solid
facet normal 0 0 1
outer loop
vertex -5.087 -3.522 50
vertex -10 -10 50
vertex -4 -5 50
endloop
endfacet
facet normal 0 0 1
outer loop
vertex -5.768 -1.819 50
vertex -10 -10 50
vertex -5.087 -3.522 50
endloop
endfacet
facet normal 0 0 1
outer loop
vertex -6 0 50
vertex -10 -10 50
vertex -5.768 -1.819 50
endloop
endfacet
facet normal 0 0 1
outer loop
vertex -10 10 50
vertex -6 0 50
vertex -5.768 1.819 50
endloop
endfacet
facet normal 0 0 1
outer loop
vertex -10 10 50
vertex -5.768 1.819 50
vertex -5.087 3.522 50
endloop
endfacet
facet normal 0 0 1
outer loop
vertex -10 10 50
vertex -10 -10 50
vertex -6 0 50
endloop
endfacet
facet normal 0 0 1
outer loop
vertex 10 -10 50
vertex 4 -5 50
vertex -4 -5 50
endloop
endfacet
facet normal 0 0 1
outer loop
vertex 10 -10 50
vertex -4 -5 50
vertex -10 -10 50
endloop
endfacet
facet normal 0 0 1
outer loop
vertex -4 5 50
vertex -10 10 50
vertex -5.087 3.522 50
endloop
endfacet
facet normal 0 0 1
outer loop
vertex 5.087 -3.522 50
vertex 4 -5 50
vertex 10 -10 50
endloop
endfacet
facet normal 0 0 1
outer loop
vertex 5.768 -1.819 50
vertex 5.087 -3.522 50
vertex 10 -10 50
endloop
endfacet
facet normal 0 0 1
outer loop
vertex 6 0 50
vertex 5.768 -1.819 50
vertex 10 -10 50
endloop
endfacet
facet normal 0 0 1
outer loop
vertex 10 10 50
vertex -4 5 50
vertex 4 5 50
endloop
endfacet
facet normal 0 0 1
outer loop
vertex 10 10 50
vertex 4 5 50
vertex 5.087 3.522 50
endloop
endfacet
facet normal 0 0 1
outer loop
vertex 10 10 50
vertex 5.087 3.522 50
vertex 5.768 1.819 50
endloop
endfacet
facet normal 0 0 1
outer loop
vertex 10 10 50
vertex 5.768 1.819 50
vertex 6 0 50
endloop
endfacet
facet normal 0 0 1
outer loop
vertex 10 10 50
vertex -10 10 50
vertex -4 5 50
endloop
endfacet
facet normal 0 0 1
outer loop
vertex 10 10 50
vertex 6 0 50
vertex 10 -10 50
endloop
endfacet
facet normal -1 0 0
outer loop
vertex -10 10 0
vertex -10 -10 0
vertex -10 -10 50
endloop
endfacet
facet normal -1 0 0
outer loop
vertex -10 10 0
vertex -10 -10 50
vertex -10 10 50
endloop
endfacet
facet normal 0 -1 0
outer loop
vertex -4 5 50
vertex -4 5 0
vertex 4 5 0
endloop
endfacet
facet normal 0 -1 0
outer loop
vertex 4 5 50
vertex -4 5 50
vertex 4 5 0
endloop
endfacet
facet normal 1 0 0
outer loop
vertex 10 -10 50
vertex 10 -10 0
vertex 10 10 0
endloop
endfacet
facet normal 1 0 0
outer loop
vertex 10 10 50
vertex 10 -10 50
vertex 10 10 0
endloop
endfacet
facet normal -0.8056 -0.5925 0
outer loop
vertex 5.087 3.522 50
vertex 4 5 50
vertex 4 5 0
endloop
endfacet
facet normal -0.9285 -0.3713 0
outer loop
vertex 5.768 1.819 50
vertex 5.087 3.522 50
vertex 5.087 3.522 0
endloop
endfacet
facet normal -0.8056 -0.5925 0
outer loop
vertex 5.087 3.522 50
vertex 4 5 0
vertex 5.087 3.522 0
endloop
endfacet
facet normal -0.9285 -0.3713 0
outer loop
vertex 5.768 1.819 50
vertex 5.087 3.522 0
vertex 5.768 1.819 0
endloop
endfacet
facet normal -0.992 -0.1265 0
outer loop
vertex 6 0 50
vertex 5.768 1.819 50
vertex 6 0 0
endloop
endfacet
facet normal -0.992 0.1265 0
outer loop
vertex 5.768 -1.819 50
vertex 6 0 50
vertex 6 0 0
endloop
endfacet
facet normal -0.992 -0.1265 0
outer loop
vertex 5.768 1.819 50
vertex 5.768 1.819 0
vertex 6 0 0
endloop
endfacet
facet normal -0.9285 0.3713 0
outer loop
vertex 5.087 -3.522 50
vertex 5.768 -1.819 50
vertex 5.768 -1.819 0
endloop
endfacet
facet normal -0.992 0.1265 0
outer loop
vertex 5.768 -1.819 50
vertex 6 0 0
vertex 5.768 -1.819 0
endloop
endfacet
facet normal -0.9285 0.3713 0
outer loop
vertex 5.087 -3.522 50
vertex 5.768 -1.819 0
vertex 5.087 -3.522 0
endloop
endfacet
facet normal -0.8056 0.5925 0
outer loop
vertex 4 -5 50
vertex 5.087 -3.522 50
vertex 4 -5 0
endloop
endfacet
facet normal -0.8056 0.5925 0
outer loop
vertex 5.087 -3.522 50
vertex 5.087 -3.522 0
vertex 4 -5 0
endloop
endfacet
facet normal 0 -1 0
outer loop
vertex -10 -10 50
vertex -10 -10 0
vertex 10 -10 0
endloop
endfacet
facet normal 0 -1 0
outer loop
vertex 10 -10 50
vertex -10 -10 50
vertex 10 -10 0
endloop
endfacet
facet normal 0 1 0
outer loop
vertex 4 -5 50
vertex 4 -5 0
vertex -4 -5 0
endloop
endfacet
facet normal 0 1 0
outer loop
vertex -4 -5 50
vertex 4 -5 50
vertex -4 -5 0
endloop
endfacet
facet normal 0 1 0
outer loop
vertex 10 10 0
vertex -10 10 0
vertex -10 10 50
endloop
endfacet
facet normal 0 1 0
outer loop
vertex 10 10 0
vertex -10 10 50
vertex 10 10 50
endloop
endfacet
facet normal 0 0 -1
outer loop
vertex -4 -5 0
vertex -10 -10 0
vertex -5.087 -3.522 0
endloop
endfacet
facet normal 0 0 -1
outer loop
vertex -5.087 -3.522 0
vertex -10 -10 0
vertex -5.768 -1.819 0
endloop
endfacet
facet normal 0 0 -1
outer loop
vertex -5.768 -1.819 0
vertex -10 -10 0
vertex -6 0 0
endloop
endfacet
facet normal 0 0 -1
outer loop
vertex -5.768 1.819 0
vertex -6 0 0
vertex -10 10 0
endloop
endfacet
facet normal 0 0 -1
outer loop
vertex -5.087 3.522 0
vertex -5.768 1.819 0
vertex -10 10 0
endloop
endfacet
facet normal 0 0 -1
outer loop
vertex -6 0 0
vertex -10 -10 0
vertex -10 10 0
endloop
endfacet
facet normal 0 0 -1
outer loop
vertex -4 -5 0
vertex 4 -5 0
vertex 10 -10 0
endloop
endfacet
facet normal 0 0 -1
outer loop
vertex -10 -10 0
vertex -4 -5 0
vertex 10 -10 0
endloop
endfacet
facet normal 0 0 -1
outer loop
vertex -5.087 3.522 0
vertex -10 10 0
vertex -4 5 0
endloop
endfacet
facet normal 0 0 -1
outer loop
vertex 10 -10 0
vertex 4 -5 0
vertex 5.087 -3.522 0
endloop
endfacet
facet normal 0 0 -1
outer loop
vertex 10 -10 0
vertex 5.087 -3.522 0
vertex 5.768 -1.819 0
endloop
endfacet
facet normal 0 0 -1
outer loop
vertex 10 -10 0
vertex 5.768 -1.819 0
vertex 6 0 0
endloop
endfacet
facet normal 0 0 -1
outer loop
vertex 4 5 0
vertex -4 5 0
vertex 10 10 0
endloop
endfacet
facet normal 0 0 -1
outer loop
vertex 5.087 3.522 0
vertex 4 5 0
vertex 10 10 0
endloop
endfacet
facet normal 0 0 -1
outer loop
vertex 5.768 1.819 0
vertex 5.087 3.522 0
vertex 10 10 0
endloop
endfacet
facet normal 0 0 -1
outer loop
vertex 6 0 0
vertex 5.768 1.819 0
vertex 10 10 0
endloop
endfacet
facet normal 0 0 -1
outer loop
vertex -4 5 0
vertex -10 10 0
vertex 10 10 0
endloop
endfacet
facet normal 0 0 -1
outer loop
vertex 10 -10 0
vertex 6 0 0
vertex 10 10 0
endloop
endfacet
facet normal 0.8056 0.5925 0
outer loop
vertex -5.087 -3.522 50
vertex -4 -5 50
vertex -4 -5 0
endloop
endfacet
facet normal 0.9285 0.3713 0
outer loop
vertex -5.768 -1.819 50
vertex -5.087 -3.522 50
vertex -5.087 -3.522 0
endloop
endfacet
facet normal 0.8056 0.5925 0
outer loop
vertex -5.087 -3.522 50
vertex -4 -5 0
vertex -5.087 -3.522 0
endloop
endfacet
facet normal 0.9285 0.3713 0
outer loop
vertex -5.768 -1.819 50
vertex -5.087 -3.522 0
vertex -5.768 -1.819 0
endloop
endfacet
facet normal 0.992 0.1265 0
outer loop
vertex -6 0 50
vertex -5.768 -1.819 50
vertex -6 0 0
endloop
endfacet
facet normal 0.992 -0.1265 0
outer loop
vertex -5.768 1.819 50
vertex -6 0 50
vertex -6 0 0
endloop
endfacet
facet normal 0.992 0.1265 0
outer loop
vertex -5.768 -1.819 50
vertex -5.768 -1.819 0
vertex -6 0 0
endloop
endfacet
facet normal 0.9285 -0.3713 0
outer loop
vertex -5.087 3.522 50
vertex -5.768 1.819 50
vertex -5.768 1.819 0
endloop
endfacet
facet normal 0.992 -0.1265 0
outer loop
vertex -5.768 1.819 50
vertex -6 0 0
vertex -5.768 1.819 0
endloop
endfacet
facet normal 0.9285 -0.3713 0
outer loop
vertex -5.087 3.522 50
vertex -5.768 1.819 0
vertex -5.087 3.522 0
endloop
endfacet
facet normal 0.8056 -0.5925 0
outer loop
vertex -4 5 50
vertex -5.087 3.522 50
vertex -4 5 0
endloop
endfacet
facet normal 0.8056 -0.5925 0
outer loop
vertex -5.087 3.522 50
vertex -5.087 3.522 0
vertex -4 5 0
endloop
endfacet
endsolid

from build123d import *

# Parameters (mm, degrees)
SKETCH_1_W          = 20
SKETCH_1_H          = 20
EXTRUDE_1_DEPTH     = 50
CUT_EXTRUDE_1_DEPTH = 50


with BuildPart() as part:
    # 草圖1 → 填料-伸長1 (new body)
    with BuildSketch(Plane.XY):
        Rectangle(SKETCH_1_W, SKETCH_1_H)
    extrude(amount=EXTRUDE_1_DEPTH)

    # 草圖2 → 除料-伸長1 (cut)
    with BuildSketch(Plane.XY):
        with BuildLine():
            Line((-4, 5), (4, 5))
            ThreePointArc((4, 5), (6, 0), (4, -5))
            Line((4, -5), (-4, -5))
            ThreePointArc((-4, -5), (-6, 0), (-4, 5))
        make_face()
    extrude(amount=CUT_EXTRUDE_1_DEPTH, mode=Mode.SUBTRACT)


solid = part.part
